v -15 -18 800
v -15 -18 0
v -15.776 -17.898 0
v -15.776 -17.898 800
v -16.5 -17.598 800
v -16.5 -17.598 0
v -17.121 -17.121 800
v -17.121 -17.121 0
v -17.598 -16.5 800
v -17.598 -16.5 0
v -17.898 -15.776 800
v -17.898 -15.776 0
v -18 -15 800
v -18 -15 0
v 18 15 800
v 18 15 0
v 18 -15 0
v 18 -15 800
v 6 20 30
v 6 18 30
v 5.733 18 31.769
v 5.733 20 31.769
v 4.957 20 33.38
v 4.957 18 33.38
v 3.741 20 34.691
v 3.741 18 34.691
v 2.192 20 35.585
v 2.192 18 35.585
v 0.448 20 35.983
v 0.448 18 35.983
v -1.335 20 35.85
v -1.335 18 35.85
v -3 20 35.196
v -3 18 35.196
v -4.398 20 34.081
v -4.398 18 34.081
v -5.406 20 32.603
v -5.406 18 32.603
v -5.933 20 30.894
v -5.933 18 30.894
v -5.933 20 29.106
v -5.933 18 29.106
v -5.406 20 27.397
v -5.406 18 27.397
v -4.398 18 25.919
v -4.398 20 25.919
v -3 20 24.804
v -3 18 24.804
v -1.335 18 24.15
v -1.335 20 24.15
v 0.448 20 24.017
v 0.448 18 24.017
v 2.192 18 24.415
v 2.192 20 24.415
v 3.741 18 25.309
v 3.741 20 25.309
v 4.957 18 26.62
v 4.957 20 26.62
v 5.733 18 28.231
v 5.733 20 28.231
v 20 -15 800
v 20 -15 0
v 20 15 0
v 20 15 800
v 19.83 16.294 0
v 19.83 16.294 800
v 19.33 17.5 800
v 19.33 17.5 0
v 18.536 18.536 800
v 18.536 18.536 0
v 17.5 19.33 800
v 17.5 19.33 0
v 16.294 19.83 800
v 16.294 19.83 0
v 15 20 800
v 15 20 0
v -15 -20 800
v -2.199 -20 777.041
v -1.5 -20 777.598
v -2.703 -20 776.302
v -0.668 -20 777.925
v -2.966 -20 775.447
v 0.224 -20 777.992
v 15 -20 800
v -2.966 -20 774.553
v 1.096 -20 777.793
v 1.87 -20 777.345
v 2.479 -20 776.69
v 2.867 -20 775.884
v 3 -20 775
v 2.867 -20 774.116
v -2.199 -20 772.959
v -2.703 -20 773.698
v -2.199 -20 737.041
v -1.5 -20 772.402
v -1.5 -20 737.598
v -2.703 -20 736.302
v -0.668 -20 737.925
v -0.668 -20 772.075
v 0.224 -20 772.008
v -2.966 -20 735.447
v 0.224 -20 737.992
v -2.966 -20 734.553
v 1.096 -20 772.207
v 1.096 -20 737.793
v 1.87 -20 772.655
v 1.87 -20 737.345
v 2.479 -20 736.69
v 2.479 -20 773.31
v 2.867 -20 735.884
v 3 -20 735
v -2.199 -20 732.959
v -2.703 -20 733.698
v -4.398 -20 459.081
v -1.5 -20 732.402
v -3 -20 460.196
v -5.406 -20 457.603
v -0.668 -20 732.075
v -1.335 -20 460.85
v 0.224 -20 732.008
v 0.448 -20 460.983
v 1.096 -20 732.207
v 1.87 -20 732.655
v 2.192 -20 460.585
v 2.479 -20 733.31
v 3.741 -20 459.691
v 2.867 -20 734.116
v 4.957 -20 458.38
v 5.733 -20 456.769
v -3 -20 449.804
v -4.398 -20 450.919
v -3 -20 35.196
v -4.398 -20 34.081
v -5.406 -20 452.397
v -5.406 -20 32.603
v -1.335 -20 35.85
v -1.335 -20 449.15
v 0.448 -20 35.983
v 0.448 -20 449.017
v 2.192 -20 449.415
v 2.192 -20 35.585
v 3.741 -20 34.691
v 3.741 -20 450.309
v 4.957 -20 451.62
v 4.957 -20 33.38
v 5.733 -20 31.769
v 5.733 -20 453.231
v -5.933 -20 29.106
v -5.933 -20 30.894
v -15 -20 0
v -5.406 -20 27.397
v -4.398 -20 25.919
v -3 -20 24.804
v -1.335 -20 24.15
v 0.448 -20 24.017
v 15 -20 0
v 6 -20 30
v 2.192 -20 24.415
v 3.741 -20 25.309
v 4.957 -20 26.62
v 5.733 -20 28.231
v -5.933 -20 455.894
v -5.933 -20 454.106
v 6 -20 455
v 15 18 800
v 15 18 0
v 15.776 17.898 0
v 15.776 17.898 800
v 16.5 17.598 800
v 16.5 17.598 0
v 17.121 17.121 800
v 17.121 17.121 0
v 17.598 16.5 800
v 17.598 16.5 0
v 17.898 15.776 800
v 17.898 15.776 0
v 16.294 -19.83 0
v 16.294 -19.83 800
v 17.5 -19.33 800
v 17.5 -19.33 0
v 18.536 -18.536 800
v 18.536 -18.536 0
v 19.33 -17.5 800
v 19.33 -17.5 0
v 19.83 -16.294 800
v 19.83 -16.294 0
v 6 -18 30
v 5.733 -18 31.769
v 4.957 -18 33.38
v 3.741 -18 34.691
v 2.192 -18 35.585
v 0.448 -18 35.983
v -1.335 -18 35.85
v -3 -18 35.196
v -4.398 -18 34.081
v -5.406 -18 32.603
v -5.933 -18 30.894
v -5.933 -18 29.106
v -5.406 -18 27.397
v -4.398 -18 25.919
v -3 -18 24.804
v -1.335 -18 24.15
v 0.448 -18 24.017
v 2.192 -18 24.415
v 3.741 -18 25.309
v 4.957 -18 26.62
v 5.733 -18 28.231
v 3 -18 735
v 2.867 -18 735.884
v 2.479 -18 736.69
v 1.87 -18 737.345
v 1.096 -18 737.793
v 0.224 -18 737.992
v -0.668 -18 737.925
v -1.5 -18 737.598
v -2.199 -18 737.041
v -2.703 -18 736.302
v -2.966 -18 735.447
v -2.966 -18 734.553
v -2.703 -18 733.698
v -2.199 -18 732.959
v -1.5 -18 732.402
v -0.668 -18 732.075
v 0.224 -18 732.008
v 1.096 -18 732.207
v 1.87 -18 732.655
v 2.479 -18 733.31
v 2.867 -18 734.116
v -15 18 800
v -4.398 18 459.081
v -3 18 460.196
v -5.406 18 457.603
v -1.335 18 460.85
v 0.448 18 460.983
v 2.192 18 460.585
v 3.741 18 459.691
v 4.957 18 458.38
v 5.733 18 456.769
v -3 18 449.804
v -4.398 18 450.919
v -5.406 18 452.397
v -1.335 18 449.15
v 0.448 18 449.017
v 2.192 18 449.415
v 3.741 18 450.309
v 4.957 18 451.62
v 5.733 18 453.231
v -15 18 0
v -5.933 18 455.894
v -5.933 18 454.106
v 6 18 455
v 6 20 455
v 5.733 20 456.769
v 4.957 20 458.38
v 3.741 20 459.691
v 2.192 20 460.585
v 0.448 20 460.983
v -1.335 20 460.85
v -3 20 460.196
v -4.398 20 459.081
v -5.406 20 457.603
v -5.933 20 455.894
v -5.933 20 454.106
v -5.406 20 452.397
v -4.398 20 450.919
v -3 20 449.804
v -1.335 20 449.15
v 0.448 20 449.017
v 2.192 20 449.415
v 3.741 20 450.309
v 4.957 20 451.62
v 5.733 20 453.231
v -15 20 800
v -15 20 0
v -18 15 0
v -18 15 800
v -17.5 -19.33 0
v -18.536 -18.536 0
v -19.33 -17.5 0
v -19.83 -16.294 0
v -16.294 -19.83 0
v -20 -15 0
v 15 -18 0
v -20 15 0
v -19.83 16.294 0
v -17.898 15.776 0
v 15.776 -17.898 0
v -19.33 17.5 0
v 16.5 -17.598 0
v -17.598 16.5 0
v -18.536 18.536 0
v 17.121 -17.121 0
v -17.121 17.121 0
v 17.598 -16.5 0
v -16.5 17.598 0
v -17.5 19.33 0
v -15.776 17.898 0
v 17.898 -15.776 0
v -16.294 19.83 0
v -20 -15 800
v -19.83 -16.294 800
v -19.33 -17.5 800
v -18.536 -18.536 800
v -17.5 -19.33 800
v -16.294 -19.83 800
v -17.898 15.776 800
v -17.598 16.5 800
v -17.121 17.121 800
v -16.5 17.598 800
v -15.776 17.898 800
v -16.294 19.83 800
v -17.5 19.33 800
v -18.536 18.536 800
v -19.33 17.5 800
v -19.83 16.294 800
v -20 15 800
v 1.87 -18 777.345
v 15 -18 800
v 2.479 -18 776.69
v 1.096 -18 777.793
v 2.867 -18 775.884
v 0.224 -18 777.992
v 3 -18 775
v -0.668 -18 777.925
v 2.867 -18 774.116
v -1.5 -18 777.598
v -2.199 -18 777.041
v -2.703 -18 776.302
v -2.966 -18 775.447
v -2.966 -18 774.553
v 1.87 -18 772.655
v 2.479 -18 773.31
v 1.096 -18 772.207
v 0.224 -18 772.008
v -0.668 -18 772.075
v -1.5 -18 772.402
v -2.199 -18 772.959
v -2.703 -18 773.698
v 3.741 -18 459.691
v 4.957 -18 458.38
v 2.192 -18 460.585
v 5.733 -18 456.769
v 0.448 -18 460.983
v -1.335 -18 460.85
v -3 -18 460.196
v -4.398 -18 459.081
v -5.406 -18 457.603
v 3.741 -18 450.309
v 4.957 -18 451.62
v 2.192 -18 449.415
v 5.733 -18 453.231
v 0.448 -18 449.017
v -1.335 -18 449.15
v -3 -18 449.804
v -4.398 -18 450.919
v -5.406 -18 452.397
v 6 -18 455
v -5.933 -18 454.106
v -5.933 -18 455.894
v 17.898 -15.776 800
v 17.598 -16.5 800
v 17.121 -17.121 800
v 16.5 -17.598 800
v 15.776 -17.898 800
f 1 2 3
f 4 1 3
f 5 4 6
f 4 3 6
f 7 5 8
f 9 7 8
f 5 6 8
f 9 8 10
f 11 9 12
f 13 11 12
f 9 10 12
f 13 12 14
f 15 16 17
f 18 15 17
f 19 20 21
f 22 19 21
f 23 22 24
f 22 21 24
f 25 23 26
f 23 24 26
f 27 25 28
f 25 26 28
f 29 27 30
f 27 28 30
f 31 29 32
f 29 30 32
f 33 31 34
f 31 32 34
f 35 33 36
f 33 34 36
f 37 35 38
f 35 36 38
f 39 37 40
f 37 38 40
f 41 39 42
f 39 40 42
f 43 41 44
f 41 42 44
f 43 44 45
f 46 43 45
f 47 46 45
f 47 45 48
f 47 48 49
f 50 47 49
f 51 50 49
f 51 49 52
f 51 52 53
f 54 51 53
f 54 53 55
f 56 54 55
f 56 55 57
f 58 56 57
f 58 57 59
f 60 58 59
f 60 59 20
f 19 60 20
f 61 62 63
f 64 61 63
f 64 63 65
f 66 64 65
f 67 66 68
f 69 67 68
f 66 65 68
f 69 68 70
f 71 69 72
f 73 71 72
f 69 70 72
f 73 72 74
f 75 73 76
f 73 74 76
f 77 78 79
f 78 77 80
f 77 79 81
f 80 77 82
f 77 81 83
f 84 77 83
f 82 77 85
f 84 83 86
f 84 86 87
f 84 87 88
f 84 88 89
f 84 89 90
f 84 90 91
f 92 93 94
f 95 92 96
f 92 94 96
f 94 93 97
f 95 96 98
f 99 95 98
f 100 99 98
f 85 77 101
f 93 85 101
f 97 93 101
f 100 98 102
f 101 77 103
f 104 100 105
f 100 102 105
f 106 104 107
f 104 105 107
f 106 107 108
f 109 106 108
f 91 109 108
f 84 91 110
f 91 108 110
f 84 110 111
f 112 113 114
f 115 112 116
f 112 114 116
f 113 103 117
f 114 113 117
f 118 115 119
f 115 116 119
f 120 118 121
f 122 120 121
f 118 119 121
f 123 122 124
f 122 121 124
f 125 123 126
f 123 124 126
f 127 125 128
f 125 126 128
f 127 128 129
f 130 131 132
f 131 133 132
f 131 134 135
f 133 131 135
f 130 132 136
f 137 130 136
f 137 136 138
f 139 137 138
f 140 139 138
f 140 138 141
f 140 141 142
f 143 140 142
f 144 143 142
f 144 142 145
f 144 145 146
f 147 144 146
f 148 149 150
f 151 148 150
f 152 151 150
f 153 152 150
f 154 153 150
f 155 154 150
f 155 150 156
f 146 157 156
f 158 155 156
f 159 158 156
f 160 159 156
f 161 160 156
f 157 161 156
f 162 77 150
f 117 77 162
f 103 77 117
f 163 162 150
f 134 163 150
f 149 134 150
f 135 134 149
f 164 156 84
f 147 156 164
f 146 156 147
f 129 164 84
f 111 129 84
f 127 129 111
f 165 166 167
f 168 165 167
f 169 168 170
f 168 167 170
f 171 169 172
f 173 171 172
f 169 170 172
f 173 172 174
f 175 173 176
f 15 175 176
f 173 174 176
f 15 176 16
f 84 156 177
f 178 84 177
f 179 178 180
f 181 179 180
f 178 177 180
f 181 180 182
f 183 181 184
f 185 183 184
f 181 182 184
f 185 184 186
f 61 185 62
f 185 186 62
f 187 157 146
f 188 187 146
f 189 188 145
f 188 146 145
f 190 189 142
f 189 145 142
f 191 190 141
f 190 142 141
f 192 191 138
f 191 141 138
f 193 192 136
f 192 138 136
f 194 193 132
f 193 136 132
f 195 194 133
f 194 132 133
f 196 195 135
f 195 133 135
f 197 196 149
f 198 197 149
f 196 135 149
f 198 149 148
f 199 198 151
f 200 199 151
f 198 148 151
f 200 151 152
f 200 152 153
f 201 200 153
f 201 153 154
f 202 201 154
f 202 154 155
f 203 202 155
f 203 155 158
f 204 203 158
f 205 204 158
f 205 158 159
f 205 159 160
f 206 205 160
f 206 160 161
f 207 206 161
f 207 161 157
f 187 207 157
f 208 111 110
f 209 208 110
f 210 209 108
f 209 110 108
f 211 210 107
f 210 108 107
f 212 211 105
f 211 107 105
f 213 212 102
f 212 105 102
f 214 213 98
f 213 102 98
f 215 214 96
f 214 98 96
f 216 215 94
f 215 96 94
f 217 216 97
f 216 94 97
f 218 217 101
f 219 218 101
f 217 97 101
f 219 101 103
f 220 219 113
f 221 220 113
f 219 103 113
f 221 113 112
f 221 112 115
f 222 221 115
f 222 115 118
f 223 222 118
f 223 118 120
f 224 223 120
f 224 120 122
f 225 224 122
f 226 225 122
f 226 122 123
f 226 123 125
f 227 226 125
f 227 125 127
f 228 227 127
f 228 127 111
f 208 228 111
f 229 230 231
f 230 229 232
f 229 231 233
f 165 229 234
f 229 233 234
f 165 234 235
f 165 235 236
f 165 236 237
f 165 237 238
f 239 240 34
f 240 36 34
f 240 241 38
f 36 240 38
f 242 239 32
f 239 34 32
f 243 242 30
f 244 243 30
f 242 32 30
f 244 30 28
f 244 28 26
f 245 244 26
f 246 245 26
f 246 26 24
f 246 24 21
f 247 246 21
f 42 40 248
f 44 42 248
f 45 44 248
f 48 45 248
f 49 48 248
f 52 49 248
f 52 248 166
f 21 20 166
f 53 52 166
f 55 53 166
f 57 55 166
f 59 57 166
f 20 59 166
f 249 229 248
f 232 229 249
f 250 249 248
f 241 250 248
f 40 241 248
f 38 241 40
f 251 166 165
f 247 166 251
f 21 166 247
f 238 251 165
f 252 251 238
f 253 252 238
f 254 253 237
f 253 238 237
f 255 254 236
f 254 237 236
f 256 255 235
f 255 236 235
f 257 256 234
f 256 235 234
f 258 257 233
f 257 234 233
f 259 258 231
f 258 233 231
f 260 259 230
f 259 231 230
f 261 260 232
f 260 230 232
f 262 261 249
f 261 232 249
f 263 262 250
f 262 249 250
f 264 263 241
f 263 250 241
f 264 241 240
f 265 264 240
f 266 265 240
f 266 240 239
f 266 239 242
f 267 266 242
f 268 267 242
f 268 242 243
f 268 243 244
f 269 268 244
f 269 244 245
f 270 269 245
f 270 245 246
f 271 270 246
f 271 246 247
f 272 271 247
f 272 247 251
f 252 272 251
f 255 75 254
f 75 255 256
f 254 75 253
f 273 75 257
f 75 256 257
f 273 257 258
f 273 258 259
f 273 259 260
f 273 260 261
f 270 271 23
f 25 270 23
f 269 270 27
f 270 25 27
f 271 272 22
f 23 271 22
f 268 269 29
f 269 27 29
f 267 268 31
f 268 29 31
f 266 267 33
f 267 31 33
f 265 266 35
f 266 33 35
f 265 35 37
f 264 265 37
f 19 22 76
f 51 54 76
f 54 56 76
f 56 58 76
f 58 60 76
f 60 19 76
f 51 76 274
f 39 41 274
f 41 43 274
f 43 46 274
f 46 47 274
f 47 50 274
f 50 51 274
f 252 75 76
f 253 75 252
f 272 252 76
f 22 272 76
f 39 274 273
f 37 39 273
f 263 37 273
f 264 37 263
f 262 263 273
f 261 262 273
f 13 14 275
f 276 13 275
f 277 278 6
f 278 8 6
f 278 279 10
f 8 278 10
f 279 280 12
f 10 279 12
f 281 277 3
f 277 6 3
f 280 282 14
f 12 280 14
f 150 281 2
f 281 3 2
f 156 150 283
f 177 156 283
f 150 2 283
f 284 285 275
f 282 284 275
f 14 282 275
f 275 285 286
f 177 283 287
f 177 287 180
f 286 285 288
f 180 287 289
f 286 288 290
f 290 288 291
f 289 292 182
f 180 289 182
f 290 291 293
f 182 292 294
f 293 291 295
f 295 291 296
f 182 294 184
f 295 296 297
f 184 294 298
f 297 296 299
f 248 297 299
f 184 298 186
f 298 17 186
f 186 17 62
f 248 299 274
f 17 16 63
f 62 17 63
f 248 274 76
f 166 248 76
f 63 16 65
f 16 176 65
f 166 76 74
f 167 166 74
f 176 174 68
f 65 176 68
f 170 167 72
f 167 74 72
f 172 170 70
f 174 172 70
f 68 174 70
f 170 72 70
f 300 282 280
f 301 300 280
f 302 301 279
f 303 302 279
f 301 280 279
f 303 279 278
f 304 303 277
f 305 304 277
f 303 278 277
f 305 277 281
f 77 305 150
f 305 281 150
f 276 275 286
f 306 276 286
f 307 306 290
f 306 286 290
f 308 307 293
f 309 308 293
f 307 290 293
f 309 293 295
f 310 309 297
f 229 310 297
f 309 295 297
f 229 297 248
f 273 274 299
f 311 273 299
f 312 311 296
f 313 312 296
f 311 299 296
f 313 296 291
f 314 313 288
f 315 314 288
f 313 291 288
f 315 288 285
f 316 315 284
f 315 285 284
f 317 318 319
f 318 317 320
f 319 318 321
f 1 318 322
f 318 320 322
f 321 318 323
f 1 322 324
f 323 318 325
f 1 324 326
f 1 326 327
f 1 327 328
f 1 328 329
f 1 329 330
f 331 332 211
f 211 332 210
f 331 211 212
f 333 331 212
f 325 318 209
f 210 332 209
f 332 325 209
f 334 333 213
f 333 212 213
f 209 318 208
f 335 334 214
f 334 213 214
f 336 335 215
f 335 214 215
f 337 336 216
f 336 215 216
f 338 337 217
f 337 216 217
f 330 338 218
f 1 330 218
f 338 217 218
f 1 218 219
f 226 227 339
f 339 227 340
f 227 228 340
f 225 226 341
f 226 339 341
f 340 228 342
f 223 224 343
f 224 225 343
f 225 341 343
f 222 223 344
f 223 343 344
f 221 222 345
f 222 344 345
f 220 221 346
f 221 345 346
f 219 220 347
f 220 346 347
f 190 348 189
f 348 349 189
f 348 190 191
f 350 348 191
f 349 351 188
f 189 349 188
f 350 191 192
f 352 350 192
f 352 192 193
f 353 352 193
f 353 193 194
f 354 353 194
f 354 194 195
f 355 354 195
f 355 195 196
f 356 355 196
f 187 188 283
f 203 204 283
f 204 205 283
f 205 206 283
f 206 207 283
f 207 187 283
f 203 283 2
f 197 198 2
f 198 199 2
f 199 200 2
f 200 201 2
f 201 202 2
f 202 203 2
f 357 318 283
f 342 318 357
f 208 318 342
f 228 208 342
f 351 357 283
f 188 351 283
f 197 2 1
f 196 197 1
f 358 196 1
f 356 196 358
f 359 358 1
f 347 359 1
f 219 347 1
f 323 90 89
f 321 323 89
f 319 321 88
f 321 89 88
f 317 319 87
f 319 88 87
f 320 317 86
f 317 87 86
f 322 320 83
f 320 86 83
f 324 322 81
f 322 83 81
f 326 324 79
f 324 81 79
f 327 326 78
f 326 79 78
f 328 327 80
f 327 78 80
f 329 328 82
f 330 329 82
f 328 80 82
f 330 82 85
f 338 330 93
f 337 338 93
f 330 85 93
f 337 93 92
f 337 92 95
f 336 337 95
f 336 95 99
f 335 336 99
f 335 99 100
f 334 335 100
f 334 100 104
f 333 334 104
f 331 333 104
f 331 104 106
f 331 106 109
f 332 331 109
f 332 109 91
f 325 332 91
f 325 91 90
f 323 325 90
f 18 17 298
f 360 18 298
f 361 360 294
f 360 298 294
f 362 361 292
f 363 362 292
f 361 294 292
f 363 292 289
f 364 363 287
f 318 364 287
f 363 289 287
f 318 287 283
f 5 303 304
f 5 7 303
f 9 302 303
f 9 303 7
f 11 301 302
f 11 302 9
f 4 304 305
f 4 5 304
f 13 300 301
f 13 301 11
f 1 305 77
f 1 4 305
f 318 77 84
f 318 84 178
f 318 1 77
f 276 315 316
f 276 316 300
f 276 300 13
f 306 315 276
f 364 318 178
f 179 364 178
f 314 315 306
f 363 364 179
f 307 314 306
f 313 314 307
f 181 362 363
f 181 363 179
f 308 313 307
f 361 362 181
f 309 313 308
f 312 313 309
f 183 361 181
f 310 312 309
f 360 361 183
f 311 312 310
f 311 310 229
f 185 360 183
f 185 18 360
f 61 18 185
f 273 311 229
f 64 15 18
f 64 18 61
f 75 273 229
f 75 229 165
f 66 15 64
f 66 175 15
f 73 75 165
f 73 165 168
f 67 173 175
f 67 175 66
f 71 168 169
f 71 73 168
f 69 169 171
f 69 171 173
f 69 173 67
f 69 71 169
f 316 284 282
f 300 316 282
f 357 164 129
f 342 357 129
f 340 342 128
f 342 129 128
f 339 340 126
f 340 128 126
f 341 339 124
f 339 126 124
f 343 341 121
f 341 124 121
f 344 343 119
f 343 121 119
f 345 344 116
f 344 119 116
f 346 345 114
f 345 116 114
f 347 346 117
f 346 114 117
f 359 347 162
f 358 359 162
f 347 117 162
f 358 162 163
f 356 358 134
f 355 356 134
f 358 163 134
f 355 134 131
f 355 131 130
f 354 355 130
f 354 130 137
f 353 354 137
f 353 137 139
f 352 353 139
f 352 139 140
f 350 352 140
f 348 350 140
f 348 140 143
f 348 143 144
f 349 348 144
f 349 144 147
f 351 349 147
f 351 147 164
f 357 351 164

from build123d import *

# Parameters (mm, degrees)
F1_DEPTH = 800
F2_R     = 3
F3_DEPTH = 25
F5_R     = 6
F6_DEPTH = 40.001


with BuildPart() as f1:
    # F0 (on Top) → F1 (new body)
    with BuildSketch(Plane.XY):
        with BuildLine():
            Line((-15, -20), (15, -20))
            ThreePointArc((15, -20), (18.535534, -18.535534), (20, -15))
            Line((20, -15), (20, 15))
            ThreePointArc((20, 15), (18.535534, 18.535534), (15, 20))
            Line((15, 20), (-15, 20))
            ThreePointArc((-15, 20), (-18.535534, 18.535534), (-20, 15))
            Line((-20, 15), (-20, -15))
            ThreePointArc((-20, -15), (-18.535534, -18.535534), (-15, -20))
        make_face()
        with BuildLine():
            ThreePointArc((18, -15), (17.12132, -17.12132), (15, -18))
            Line((15, -18), (-15, -18))
            ThreePointArc((-15, -18), (-17.12132, -17.12132), (-18, -15))
            Line((-18, -15), (-18, 15))
            ThreePointArc((-18, 15), (-17.12132, 17.12132), (-15, 18))
            Line((-15, 18), (15, 18))
            ThreePointArc((15, 18), (17.12132, 17.12132), (18, 15))
            Line((18, 15), (18, -15))
        make_face(mode=Mode.SUBTRACT)
    extrude(amount=F1_DEPTH)

    # F2 (on face) → F3 (cut)
    with BuildSketch(Plane.XZ.offset(20)):
        with Locations((0, 775)):
            Circle(F2_R)
        with Locations((0, 735)):
            Circle(F2_R)
    extrude(amount=-F3_DEPTH, mode=Mode.SUBTRACT)

    # F5 (on face) → F6 (cut, through all)
    with BuildSketch(Plane.XZ.offset(20)):
        with Locations((0, 455)):
            Circle(F5_R)
        with Locations((0, 30)):
            Circle(F5_R)
    extrude(amount=-F6_DEPTH, mode=Mode.SUBTRACT)


solid = f1.part
